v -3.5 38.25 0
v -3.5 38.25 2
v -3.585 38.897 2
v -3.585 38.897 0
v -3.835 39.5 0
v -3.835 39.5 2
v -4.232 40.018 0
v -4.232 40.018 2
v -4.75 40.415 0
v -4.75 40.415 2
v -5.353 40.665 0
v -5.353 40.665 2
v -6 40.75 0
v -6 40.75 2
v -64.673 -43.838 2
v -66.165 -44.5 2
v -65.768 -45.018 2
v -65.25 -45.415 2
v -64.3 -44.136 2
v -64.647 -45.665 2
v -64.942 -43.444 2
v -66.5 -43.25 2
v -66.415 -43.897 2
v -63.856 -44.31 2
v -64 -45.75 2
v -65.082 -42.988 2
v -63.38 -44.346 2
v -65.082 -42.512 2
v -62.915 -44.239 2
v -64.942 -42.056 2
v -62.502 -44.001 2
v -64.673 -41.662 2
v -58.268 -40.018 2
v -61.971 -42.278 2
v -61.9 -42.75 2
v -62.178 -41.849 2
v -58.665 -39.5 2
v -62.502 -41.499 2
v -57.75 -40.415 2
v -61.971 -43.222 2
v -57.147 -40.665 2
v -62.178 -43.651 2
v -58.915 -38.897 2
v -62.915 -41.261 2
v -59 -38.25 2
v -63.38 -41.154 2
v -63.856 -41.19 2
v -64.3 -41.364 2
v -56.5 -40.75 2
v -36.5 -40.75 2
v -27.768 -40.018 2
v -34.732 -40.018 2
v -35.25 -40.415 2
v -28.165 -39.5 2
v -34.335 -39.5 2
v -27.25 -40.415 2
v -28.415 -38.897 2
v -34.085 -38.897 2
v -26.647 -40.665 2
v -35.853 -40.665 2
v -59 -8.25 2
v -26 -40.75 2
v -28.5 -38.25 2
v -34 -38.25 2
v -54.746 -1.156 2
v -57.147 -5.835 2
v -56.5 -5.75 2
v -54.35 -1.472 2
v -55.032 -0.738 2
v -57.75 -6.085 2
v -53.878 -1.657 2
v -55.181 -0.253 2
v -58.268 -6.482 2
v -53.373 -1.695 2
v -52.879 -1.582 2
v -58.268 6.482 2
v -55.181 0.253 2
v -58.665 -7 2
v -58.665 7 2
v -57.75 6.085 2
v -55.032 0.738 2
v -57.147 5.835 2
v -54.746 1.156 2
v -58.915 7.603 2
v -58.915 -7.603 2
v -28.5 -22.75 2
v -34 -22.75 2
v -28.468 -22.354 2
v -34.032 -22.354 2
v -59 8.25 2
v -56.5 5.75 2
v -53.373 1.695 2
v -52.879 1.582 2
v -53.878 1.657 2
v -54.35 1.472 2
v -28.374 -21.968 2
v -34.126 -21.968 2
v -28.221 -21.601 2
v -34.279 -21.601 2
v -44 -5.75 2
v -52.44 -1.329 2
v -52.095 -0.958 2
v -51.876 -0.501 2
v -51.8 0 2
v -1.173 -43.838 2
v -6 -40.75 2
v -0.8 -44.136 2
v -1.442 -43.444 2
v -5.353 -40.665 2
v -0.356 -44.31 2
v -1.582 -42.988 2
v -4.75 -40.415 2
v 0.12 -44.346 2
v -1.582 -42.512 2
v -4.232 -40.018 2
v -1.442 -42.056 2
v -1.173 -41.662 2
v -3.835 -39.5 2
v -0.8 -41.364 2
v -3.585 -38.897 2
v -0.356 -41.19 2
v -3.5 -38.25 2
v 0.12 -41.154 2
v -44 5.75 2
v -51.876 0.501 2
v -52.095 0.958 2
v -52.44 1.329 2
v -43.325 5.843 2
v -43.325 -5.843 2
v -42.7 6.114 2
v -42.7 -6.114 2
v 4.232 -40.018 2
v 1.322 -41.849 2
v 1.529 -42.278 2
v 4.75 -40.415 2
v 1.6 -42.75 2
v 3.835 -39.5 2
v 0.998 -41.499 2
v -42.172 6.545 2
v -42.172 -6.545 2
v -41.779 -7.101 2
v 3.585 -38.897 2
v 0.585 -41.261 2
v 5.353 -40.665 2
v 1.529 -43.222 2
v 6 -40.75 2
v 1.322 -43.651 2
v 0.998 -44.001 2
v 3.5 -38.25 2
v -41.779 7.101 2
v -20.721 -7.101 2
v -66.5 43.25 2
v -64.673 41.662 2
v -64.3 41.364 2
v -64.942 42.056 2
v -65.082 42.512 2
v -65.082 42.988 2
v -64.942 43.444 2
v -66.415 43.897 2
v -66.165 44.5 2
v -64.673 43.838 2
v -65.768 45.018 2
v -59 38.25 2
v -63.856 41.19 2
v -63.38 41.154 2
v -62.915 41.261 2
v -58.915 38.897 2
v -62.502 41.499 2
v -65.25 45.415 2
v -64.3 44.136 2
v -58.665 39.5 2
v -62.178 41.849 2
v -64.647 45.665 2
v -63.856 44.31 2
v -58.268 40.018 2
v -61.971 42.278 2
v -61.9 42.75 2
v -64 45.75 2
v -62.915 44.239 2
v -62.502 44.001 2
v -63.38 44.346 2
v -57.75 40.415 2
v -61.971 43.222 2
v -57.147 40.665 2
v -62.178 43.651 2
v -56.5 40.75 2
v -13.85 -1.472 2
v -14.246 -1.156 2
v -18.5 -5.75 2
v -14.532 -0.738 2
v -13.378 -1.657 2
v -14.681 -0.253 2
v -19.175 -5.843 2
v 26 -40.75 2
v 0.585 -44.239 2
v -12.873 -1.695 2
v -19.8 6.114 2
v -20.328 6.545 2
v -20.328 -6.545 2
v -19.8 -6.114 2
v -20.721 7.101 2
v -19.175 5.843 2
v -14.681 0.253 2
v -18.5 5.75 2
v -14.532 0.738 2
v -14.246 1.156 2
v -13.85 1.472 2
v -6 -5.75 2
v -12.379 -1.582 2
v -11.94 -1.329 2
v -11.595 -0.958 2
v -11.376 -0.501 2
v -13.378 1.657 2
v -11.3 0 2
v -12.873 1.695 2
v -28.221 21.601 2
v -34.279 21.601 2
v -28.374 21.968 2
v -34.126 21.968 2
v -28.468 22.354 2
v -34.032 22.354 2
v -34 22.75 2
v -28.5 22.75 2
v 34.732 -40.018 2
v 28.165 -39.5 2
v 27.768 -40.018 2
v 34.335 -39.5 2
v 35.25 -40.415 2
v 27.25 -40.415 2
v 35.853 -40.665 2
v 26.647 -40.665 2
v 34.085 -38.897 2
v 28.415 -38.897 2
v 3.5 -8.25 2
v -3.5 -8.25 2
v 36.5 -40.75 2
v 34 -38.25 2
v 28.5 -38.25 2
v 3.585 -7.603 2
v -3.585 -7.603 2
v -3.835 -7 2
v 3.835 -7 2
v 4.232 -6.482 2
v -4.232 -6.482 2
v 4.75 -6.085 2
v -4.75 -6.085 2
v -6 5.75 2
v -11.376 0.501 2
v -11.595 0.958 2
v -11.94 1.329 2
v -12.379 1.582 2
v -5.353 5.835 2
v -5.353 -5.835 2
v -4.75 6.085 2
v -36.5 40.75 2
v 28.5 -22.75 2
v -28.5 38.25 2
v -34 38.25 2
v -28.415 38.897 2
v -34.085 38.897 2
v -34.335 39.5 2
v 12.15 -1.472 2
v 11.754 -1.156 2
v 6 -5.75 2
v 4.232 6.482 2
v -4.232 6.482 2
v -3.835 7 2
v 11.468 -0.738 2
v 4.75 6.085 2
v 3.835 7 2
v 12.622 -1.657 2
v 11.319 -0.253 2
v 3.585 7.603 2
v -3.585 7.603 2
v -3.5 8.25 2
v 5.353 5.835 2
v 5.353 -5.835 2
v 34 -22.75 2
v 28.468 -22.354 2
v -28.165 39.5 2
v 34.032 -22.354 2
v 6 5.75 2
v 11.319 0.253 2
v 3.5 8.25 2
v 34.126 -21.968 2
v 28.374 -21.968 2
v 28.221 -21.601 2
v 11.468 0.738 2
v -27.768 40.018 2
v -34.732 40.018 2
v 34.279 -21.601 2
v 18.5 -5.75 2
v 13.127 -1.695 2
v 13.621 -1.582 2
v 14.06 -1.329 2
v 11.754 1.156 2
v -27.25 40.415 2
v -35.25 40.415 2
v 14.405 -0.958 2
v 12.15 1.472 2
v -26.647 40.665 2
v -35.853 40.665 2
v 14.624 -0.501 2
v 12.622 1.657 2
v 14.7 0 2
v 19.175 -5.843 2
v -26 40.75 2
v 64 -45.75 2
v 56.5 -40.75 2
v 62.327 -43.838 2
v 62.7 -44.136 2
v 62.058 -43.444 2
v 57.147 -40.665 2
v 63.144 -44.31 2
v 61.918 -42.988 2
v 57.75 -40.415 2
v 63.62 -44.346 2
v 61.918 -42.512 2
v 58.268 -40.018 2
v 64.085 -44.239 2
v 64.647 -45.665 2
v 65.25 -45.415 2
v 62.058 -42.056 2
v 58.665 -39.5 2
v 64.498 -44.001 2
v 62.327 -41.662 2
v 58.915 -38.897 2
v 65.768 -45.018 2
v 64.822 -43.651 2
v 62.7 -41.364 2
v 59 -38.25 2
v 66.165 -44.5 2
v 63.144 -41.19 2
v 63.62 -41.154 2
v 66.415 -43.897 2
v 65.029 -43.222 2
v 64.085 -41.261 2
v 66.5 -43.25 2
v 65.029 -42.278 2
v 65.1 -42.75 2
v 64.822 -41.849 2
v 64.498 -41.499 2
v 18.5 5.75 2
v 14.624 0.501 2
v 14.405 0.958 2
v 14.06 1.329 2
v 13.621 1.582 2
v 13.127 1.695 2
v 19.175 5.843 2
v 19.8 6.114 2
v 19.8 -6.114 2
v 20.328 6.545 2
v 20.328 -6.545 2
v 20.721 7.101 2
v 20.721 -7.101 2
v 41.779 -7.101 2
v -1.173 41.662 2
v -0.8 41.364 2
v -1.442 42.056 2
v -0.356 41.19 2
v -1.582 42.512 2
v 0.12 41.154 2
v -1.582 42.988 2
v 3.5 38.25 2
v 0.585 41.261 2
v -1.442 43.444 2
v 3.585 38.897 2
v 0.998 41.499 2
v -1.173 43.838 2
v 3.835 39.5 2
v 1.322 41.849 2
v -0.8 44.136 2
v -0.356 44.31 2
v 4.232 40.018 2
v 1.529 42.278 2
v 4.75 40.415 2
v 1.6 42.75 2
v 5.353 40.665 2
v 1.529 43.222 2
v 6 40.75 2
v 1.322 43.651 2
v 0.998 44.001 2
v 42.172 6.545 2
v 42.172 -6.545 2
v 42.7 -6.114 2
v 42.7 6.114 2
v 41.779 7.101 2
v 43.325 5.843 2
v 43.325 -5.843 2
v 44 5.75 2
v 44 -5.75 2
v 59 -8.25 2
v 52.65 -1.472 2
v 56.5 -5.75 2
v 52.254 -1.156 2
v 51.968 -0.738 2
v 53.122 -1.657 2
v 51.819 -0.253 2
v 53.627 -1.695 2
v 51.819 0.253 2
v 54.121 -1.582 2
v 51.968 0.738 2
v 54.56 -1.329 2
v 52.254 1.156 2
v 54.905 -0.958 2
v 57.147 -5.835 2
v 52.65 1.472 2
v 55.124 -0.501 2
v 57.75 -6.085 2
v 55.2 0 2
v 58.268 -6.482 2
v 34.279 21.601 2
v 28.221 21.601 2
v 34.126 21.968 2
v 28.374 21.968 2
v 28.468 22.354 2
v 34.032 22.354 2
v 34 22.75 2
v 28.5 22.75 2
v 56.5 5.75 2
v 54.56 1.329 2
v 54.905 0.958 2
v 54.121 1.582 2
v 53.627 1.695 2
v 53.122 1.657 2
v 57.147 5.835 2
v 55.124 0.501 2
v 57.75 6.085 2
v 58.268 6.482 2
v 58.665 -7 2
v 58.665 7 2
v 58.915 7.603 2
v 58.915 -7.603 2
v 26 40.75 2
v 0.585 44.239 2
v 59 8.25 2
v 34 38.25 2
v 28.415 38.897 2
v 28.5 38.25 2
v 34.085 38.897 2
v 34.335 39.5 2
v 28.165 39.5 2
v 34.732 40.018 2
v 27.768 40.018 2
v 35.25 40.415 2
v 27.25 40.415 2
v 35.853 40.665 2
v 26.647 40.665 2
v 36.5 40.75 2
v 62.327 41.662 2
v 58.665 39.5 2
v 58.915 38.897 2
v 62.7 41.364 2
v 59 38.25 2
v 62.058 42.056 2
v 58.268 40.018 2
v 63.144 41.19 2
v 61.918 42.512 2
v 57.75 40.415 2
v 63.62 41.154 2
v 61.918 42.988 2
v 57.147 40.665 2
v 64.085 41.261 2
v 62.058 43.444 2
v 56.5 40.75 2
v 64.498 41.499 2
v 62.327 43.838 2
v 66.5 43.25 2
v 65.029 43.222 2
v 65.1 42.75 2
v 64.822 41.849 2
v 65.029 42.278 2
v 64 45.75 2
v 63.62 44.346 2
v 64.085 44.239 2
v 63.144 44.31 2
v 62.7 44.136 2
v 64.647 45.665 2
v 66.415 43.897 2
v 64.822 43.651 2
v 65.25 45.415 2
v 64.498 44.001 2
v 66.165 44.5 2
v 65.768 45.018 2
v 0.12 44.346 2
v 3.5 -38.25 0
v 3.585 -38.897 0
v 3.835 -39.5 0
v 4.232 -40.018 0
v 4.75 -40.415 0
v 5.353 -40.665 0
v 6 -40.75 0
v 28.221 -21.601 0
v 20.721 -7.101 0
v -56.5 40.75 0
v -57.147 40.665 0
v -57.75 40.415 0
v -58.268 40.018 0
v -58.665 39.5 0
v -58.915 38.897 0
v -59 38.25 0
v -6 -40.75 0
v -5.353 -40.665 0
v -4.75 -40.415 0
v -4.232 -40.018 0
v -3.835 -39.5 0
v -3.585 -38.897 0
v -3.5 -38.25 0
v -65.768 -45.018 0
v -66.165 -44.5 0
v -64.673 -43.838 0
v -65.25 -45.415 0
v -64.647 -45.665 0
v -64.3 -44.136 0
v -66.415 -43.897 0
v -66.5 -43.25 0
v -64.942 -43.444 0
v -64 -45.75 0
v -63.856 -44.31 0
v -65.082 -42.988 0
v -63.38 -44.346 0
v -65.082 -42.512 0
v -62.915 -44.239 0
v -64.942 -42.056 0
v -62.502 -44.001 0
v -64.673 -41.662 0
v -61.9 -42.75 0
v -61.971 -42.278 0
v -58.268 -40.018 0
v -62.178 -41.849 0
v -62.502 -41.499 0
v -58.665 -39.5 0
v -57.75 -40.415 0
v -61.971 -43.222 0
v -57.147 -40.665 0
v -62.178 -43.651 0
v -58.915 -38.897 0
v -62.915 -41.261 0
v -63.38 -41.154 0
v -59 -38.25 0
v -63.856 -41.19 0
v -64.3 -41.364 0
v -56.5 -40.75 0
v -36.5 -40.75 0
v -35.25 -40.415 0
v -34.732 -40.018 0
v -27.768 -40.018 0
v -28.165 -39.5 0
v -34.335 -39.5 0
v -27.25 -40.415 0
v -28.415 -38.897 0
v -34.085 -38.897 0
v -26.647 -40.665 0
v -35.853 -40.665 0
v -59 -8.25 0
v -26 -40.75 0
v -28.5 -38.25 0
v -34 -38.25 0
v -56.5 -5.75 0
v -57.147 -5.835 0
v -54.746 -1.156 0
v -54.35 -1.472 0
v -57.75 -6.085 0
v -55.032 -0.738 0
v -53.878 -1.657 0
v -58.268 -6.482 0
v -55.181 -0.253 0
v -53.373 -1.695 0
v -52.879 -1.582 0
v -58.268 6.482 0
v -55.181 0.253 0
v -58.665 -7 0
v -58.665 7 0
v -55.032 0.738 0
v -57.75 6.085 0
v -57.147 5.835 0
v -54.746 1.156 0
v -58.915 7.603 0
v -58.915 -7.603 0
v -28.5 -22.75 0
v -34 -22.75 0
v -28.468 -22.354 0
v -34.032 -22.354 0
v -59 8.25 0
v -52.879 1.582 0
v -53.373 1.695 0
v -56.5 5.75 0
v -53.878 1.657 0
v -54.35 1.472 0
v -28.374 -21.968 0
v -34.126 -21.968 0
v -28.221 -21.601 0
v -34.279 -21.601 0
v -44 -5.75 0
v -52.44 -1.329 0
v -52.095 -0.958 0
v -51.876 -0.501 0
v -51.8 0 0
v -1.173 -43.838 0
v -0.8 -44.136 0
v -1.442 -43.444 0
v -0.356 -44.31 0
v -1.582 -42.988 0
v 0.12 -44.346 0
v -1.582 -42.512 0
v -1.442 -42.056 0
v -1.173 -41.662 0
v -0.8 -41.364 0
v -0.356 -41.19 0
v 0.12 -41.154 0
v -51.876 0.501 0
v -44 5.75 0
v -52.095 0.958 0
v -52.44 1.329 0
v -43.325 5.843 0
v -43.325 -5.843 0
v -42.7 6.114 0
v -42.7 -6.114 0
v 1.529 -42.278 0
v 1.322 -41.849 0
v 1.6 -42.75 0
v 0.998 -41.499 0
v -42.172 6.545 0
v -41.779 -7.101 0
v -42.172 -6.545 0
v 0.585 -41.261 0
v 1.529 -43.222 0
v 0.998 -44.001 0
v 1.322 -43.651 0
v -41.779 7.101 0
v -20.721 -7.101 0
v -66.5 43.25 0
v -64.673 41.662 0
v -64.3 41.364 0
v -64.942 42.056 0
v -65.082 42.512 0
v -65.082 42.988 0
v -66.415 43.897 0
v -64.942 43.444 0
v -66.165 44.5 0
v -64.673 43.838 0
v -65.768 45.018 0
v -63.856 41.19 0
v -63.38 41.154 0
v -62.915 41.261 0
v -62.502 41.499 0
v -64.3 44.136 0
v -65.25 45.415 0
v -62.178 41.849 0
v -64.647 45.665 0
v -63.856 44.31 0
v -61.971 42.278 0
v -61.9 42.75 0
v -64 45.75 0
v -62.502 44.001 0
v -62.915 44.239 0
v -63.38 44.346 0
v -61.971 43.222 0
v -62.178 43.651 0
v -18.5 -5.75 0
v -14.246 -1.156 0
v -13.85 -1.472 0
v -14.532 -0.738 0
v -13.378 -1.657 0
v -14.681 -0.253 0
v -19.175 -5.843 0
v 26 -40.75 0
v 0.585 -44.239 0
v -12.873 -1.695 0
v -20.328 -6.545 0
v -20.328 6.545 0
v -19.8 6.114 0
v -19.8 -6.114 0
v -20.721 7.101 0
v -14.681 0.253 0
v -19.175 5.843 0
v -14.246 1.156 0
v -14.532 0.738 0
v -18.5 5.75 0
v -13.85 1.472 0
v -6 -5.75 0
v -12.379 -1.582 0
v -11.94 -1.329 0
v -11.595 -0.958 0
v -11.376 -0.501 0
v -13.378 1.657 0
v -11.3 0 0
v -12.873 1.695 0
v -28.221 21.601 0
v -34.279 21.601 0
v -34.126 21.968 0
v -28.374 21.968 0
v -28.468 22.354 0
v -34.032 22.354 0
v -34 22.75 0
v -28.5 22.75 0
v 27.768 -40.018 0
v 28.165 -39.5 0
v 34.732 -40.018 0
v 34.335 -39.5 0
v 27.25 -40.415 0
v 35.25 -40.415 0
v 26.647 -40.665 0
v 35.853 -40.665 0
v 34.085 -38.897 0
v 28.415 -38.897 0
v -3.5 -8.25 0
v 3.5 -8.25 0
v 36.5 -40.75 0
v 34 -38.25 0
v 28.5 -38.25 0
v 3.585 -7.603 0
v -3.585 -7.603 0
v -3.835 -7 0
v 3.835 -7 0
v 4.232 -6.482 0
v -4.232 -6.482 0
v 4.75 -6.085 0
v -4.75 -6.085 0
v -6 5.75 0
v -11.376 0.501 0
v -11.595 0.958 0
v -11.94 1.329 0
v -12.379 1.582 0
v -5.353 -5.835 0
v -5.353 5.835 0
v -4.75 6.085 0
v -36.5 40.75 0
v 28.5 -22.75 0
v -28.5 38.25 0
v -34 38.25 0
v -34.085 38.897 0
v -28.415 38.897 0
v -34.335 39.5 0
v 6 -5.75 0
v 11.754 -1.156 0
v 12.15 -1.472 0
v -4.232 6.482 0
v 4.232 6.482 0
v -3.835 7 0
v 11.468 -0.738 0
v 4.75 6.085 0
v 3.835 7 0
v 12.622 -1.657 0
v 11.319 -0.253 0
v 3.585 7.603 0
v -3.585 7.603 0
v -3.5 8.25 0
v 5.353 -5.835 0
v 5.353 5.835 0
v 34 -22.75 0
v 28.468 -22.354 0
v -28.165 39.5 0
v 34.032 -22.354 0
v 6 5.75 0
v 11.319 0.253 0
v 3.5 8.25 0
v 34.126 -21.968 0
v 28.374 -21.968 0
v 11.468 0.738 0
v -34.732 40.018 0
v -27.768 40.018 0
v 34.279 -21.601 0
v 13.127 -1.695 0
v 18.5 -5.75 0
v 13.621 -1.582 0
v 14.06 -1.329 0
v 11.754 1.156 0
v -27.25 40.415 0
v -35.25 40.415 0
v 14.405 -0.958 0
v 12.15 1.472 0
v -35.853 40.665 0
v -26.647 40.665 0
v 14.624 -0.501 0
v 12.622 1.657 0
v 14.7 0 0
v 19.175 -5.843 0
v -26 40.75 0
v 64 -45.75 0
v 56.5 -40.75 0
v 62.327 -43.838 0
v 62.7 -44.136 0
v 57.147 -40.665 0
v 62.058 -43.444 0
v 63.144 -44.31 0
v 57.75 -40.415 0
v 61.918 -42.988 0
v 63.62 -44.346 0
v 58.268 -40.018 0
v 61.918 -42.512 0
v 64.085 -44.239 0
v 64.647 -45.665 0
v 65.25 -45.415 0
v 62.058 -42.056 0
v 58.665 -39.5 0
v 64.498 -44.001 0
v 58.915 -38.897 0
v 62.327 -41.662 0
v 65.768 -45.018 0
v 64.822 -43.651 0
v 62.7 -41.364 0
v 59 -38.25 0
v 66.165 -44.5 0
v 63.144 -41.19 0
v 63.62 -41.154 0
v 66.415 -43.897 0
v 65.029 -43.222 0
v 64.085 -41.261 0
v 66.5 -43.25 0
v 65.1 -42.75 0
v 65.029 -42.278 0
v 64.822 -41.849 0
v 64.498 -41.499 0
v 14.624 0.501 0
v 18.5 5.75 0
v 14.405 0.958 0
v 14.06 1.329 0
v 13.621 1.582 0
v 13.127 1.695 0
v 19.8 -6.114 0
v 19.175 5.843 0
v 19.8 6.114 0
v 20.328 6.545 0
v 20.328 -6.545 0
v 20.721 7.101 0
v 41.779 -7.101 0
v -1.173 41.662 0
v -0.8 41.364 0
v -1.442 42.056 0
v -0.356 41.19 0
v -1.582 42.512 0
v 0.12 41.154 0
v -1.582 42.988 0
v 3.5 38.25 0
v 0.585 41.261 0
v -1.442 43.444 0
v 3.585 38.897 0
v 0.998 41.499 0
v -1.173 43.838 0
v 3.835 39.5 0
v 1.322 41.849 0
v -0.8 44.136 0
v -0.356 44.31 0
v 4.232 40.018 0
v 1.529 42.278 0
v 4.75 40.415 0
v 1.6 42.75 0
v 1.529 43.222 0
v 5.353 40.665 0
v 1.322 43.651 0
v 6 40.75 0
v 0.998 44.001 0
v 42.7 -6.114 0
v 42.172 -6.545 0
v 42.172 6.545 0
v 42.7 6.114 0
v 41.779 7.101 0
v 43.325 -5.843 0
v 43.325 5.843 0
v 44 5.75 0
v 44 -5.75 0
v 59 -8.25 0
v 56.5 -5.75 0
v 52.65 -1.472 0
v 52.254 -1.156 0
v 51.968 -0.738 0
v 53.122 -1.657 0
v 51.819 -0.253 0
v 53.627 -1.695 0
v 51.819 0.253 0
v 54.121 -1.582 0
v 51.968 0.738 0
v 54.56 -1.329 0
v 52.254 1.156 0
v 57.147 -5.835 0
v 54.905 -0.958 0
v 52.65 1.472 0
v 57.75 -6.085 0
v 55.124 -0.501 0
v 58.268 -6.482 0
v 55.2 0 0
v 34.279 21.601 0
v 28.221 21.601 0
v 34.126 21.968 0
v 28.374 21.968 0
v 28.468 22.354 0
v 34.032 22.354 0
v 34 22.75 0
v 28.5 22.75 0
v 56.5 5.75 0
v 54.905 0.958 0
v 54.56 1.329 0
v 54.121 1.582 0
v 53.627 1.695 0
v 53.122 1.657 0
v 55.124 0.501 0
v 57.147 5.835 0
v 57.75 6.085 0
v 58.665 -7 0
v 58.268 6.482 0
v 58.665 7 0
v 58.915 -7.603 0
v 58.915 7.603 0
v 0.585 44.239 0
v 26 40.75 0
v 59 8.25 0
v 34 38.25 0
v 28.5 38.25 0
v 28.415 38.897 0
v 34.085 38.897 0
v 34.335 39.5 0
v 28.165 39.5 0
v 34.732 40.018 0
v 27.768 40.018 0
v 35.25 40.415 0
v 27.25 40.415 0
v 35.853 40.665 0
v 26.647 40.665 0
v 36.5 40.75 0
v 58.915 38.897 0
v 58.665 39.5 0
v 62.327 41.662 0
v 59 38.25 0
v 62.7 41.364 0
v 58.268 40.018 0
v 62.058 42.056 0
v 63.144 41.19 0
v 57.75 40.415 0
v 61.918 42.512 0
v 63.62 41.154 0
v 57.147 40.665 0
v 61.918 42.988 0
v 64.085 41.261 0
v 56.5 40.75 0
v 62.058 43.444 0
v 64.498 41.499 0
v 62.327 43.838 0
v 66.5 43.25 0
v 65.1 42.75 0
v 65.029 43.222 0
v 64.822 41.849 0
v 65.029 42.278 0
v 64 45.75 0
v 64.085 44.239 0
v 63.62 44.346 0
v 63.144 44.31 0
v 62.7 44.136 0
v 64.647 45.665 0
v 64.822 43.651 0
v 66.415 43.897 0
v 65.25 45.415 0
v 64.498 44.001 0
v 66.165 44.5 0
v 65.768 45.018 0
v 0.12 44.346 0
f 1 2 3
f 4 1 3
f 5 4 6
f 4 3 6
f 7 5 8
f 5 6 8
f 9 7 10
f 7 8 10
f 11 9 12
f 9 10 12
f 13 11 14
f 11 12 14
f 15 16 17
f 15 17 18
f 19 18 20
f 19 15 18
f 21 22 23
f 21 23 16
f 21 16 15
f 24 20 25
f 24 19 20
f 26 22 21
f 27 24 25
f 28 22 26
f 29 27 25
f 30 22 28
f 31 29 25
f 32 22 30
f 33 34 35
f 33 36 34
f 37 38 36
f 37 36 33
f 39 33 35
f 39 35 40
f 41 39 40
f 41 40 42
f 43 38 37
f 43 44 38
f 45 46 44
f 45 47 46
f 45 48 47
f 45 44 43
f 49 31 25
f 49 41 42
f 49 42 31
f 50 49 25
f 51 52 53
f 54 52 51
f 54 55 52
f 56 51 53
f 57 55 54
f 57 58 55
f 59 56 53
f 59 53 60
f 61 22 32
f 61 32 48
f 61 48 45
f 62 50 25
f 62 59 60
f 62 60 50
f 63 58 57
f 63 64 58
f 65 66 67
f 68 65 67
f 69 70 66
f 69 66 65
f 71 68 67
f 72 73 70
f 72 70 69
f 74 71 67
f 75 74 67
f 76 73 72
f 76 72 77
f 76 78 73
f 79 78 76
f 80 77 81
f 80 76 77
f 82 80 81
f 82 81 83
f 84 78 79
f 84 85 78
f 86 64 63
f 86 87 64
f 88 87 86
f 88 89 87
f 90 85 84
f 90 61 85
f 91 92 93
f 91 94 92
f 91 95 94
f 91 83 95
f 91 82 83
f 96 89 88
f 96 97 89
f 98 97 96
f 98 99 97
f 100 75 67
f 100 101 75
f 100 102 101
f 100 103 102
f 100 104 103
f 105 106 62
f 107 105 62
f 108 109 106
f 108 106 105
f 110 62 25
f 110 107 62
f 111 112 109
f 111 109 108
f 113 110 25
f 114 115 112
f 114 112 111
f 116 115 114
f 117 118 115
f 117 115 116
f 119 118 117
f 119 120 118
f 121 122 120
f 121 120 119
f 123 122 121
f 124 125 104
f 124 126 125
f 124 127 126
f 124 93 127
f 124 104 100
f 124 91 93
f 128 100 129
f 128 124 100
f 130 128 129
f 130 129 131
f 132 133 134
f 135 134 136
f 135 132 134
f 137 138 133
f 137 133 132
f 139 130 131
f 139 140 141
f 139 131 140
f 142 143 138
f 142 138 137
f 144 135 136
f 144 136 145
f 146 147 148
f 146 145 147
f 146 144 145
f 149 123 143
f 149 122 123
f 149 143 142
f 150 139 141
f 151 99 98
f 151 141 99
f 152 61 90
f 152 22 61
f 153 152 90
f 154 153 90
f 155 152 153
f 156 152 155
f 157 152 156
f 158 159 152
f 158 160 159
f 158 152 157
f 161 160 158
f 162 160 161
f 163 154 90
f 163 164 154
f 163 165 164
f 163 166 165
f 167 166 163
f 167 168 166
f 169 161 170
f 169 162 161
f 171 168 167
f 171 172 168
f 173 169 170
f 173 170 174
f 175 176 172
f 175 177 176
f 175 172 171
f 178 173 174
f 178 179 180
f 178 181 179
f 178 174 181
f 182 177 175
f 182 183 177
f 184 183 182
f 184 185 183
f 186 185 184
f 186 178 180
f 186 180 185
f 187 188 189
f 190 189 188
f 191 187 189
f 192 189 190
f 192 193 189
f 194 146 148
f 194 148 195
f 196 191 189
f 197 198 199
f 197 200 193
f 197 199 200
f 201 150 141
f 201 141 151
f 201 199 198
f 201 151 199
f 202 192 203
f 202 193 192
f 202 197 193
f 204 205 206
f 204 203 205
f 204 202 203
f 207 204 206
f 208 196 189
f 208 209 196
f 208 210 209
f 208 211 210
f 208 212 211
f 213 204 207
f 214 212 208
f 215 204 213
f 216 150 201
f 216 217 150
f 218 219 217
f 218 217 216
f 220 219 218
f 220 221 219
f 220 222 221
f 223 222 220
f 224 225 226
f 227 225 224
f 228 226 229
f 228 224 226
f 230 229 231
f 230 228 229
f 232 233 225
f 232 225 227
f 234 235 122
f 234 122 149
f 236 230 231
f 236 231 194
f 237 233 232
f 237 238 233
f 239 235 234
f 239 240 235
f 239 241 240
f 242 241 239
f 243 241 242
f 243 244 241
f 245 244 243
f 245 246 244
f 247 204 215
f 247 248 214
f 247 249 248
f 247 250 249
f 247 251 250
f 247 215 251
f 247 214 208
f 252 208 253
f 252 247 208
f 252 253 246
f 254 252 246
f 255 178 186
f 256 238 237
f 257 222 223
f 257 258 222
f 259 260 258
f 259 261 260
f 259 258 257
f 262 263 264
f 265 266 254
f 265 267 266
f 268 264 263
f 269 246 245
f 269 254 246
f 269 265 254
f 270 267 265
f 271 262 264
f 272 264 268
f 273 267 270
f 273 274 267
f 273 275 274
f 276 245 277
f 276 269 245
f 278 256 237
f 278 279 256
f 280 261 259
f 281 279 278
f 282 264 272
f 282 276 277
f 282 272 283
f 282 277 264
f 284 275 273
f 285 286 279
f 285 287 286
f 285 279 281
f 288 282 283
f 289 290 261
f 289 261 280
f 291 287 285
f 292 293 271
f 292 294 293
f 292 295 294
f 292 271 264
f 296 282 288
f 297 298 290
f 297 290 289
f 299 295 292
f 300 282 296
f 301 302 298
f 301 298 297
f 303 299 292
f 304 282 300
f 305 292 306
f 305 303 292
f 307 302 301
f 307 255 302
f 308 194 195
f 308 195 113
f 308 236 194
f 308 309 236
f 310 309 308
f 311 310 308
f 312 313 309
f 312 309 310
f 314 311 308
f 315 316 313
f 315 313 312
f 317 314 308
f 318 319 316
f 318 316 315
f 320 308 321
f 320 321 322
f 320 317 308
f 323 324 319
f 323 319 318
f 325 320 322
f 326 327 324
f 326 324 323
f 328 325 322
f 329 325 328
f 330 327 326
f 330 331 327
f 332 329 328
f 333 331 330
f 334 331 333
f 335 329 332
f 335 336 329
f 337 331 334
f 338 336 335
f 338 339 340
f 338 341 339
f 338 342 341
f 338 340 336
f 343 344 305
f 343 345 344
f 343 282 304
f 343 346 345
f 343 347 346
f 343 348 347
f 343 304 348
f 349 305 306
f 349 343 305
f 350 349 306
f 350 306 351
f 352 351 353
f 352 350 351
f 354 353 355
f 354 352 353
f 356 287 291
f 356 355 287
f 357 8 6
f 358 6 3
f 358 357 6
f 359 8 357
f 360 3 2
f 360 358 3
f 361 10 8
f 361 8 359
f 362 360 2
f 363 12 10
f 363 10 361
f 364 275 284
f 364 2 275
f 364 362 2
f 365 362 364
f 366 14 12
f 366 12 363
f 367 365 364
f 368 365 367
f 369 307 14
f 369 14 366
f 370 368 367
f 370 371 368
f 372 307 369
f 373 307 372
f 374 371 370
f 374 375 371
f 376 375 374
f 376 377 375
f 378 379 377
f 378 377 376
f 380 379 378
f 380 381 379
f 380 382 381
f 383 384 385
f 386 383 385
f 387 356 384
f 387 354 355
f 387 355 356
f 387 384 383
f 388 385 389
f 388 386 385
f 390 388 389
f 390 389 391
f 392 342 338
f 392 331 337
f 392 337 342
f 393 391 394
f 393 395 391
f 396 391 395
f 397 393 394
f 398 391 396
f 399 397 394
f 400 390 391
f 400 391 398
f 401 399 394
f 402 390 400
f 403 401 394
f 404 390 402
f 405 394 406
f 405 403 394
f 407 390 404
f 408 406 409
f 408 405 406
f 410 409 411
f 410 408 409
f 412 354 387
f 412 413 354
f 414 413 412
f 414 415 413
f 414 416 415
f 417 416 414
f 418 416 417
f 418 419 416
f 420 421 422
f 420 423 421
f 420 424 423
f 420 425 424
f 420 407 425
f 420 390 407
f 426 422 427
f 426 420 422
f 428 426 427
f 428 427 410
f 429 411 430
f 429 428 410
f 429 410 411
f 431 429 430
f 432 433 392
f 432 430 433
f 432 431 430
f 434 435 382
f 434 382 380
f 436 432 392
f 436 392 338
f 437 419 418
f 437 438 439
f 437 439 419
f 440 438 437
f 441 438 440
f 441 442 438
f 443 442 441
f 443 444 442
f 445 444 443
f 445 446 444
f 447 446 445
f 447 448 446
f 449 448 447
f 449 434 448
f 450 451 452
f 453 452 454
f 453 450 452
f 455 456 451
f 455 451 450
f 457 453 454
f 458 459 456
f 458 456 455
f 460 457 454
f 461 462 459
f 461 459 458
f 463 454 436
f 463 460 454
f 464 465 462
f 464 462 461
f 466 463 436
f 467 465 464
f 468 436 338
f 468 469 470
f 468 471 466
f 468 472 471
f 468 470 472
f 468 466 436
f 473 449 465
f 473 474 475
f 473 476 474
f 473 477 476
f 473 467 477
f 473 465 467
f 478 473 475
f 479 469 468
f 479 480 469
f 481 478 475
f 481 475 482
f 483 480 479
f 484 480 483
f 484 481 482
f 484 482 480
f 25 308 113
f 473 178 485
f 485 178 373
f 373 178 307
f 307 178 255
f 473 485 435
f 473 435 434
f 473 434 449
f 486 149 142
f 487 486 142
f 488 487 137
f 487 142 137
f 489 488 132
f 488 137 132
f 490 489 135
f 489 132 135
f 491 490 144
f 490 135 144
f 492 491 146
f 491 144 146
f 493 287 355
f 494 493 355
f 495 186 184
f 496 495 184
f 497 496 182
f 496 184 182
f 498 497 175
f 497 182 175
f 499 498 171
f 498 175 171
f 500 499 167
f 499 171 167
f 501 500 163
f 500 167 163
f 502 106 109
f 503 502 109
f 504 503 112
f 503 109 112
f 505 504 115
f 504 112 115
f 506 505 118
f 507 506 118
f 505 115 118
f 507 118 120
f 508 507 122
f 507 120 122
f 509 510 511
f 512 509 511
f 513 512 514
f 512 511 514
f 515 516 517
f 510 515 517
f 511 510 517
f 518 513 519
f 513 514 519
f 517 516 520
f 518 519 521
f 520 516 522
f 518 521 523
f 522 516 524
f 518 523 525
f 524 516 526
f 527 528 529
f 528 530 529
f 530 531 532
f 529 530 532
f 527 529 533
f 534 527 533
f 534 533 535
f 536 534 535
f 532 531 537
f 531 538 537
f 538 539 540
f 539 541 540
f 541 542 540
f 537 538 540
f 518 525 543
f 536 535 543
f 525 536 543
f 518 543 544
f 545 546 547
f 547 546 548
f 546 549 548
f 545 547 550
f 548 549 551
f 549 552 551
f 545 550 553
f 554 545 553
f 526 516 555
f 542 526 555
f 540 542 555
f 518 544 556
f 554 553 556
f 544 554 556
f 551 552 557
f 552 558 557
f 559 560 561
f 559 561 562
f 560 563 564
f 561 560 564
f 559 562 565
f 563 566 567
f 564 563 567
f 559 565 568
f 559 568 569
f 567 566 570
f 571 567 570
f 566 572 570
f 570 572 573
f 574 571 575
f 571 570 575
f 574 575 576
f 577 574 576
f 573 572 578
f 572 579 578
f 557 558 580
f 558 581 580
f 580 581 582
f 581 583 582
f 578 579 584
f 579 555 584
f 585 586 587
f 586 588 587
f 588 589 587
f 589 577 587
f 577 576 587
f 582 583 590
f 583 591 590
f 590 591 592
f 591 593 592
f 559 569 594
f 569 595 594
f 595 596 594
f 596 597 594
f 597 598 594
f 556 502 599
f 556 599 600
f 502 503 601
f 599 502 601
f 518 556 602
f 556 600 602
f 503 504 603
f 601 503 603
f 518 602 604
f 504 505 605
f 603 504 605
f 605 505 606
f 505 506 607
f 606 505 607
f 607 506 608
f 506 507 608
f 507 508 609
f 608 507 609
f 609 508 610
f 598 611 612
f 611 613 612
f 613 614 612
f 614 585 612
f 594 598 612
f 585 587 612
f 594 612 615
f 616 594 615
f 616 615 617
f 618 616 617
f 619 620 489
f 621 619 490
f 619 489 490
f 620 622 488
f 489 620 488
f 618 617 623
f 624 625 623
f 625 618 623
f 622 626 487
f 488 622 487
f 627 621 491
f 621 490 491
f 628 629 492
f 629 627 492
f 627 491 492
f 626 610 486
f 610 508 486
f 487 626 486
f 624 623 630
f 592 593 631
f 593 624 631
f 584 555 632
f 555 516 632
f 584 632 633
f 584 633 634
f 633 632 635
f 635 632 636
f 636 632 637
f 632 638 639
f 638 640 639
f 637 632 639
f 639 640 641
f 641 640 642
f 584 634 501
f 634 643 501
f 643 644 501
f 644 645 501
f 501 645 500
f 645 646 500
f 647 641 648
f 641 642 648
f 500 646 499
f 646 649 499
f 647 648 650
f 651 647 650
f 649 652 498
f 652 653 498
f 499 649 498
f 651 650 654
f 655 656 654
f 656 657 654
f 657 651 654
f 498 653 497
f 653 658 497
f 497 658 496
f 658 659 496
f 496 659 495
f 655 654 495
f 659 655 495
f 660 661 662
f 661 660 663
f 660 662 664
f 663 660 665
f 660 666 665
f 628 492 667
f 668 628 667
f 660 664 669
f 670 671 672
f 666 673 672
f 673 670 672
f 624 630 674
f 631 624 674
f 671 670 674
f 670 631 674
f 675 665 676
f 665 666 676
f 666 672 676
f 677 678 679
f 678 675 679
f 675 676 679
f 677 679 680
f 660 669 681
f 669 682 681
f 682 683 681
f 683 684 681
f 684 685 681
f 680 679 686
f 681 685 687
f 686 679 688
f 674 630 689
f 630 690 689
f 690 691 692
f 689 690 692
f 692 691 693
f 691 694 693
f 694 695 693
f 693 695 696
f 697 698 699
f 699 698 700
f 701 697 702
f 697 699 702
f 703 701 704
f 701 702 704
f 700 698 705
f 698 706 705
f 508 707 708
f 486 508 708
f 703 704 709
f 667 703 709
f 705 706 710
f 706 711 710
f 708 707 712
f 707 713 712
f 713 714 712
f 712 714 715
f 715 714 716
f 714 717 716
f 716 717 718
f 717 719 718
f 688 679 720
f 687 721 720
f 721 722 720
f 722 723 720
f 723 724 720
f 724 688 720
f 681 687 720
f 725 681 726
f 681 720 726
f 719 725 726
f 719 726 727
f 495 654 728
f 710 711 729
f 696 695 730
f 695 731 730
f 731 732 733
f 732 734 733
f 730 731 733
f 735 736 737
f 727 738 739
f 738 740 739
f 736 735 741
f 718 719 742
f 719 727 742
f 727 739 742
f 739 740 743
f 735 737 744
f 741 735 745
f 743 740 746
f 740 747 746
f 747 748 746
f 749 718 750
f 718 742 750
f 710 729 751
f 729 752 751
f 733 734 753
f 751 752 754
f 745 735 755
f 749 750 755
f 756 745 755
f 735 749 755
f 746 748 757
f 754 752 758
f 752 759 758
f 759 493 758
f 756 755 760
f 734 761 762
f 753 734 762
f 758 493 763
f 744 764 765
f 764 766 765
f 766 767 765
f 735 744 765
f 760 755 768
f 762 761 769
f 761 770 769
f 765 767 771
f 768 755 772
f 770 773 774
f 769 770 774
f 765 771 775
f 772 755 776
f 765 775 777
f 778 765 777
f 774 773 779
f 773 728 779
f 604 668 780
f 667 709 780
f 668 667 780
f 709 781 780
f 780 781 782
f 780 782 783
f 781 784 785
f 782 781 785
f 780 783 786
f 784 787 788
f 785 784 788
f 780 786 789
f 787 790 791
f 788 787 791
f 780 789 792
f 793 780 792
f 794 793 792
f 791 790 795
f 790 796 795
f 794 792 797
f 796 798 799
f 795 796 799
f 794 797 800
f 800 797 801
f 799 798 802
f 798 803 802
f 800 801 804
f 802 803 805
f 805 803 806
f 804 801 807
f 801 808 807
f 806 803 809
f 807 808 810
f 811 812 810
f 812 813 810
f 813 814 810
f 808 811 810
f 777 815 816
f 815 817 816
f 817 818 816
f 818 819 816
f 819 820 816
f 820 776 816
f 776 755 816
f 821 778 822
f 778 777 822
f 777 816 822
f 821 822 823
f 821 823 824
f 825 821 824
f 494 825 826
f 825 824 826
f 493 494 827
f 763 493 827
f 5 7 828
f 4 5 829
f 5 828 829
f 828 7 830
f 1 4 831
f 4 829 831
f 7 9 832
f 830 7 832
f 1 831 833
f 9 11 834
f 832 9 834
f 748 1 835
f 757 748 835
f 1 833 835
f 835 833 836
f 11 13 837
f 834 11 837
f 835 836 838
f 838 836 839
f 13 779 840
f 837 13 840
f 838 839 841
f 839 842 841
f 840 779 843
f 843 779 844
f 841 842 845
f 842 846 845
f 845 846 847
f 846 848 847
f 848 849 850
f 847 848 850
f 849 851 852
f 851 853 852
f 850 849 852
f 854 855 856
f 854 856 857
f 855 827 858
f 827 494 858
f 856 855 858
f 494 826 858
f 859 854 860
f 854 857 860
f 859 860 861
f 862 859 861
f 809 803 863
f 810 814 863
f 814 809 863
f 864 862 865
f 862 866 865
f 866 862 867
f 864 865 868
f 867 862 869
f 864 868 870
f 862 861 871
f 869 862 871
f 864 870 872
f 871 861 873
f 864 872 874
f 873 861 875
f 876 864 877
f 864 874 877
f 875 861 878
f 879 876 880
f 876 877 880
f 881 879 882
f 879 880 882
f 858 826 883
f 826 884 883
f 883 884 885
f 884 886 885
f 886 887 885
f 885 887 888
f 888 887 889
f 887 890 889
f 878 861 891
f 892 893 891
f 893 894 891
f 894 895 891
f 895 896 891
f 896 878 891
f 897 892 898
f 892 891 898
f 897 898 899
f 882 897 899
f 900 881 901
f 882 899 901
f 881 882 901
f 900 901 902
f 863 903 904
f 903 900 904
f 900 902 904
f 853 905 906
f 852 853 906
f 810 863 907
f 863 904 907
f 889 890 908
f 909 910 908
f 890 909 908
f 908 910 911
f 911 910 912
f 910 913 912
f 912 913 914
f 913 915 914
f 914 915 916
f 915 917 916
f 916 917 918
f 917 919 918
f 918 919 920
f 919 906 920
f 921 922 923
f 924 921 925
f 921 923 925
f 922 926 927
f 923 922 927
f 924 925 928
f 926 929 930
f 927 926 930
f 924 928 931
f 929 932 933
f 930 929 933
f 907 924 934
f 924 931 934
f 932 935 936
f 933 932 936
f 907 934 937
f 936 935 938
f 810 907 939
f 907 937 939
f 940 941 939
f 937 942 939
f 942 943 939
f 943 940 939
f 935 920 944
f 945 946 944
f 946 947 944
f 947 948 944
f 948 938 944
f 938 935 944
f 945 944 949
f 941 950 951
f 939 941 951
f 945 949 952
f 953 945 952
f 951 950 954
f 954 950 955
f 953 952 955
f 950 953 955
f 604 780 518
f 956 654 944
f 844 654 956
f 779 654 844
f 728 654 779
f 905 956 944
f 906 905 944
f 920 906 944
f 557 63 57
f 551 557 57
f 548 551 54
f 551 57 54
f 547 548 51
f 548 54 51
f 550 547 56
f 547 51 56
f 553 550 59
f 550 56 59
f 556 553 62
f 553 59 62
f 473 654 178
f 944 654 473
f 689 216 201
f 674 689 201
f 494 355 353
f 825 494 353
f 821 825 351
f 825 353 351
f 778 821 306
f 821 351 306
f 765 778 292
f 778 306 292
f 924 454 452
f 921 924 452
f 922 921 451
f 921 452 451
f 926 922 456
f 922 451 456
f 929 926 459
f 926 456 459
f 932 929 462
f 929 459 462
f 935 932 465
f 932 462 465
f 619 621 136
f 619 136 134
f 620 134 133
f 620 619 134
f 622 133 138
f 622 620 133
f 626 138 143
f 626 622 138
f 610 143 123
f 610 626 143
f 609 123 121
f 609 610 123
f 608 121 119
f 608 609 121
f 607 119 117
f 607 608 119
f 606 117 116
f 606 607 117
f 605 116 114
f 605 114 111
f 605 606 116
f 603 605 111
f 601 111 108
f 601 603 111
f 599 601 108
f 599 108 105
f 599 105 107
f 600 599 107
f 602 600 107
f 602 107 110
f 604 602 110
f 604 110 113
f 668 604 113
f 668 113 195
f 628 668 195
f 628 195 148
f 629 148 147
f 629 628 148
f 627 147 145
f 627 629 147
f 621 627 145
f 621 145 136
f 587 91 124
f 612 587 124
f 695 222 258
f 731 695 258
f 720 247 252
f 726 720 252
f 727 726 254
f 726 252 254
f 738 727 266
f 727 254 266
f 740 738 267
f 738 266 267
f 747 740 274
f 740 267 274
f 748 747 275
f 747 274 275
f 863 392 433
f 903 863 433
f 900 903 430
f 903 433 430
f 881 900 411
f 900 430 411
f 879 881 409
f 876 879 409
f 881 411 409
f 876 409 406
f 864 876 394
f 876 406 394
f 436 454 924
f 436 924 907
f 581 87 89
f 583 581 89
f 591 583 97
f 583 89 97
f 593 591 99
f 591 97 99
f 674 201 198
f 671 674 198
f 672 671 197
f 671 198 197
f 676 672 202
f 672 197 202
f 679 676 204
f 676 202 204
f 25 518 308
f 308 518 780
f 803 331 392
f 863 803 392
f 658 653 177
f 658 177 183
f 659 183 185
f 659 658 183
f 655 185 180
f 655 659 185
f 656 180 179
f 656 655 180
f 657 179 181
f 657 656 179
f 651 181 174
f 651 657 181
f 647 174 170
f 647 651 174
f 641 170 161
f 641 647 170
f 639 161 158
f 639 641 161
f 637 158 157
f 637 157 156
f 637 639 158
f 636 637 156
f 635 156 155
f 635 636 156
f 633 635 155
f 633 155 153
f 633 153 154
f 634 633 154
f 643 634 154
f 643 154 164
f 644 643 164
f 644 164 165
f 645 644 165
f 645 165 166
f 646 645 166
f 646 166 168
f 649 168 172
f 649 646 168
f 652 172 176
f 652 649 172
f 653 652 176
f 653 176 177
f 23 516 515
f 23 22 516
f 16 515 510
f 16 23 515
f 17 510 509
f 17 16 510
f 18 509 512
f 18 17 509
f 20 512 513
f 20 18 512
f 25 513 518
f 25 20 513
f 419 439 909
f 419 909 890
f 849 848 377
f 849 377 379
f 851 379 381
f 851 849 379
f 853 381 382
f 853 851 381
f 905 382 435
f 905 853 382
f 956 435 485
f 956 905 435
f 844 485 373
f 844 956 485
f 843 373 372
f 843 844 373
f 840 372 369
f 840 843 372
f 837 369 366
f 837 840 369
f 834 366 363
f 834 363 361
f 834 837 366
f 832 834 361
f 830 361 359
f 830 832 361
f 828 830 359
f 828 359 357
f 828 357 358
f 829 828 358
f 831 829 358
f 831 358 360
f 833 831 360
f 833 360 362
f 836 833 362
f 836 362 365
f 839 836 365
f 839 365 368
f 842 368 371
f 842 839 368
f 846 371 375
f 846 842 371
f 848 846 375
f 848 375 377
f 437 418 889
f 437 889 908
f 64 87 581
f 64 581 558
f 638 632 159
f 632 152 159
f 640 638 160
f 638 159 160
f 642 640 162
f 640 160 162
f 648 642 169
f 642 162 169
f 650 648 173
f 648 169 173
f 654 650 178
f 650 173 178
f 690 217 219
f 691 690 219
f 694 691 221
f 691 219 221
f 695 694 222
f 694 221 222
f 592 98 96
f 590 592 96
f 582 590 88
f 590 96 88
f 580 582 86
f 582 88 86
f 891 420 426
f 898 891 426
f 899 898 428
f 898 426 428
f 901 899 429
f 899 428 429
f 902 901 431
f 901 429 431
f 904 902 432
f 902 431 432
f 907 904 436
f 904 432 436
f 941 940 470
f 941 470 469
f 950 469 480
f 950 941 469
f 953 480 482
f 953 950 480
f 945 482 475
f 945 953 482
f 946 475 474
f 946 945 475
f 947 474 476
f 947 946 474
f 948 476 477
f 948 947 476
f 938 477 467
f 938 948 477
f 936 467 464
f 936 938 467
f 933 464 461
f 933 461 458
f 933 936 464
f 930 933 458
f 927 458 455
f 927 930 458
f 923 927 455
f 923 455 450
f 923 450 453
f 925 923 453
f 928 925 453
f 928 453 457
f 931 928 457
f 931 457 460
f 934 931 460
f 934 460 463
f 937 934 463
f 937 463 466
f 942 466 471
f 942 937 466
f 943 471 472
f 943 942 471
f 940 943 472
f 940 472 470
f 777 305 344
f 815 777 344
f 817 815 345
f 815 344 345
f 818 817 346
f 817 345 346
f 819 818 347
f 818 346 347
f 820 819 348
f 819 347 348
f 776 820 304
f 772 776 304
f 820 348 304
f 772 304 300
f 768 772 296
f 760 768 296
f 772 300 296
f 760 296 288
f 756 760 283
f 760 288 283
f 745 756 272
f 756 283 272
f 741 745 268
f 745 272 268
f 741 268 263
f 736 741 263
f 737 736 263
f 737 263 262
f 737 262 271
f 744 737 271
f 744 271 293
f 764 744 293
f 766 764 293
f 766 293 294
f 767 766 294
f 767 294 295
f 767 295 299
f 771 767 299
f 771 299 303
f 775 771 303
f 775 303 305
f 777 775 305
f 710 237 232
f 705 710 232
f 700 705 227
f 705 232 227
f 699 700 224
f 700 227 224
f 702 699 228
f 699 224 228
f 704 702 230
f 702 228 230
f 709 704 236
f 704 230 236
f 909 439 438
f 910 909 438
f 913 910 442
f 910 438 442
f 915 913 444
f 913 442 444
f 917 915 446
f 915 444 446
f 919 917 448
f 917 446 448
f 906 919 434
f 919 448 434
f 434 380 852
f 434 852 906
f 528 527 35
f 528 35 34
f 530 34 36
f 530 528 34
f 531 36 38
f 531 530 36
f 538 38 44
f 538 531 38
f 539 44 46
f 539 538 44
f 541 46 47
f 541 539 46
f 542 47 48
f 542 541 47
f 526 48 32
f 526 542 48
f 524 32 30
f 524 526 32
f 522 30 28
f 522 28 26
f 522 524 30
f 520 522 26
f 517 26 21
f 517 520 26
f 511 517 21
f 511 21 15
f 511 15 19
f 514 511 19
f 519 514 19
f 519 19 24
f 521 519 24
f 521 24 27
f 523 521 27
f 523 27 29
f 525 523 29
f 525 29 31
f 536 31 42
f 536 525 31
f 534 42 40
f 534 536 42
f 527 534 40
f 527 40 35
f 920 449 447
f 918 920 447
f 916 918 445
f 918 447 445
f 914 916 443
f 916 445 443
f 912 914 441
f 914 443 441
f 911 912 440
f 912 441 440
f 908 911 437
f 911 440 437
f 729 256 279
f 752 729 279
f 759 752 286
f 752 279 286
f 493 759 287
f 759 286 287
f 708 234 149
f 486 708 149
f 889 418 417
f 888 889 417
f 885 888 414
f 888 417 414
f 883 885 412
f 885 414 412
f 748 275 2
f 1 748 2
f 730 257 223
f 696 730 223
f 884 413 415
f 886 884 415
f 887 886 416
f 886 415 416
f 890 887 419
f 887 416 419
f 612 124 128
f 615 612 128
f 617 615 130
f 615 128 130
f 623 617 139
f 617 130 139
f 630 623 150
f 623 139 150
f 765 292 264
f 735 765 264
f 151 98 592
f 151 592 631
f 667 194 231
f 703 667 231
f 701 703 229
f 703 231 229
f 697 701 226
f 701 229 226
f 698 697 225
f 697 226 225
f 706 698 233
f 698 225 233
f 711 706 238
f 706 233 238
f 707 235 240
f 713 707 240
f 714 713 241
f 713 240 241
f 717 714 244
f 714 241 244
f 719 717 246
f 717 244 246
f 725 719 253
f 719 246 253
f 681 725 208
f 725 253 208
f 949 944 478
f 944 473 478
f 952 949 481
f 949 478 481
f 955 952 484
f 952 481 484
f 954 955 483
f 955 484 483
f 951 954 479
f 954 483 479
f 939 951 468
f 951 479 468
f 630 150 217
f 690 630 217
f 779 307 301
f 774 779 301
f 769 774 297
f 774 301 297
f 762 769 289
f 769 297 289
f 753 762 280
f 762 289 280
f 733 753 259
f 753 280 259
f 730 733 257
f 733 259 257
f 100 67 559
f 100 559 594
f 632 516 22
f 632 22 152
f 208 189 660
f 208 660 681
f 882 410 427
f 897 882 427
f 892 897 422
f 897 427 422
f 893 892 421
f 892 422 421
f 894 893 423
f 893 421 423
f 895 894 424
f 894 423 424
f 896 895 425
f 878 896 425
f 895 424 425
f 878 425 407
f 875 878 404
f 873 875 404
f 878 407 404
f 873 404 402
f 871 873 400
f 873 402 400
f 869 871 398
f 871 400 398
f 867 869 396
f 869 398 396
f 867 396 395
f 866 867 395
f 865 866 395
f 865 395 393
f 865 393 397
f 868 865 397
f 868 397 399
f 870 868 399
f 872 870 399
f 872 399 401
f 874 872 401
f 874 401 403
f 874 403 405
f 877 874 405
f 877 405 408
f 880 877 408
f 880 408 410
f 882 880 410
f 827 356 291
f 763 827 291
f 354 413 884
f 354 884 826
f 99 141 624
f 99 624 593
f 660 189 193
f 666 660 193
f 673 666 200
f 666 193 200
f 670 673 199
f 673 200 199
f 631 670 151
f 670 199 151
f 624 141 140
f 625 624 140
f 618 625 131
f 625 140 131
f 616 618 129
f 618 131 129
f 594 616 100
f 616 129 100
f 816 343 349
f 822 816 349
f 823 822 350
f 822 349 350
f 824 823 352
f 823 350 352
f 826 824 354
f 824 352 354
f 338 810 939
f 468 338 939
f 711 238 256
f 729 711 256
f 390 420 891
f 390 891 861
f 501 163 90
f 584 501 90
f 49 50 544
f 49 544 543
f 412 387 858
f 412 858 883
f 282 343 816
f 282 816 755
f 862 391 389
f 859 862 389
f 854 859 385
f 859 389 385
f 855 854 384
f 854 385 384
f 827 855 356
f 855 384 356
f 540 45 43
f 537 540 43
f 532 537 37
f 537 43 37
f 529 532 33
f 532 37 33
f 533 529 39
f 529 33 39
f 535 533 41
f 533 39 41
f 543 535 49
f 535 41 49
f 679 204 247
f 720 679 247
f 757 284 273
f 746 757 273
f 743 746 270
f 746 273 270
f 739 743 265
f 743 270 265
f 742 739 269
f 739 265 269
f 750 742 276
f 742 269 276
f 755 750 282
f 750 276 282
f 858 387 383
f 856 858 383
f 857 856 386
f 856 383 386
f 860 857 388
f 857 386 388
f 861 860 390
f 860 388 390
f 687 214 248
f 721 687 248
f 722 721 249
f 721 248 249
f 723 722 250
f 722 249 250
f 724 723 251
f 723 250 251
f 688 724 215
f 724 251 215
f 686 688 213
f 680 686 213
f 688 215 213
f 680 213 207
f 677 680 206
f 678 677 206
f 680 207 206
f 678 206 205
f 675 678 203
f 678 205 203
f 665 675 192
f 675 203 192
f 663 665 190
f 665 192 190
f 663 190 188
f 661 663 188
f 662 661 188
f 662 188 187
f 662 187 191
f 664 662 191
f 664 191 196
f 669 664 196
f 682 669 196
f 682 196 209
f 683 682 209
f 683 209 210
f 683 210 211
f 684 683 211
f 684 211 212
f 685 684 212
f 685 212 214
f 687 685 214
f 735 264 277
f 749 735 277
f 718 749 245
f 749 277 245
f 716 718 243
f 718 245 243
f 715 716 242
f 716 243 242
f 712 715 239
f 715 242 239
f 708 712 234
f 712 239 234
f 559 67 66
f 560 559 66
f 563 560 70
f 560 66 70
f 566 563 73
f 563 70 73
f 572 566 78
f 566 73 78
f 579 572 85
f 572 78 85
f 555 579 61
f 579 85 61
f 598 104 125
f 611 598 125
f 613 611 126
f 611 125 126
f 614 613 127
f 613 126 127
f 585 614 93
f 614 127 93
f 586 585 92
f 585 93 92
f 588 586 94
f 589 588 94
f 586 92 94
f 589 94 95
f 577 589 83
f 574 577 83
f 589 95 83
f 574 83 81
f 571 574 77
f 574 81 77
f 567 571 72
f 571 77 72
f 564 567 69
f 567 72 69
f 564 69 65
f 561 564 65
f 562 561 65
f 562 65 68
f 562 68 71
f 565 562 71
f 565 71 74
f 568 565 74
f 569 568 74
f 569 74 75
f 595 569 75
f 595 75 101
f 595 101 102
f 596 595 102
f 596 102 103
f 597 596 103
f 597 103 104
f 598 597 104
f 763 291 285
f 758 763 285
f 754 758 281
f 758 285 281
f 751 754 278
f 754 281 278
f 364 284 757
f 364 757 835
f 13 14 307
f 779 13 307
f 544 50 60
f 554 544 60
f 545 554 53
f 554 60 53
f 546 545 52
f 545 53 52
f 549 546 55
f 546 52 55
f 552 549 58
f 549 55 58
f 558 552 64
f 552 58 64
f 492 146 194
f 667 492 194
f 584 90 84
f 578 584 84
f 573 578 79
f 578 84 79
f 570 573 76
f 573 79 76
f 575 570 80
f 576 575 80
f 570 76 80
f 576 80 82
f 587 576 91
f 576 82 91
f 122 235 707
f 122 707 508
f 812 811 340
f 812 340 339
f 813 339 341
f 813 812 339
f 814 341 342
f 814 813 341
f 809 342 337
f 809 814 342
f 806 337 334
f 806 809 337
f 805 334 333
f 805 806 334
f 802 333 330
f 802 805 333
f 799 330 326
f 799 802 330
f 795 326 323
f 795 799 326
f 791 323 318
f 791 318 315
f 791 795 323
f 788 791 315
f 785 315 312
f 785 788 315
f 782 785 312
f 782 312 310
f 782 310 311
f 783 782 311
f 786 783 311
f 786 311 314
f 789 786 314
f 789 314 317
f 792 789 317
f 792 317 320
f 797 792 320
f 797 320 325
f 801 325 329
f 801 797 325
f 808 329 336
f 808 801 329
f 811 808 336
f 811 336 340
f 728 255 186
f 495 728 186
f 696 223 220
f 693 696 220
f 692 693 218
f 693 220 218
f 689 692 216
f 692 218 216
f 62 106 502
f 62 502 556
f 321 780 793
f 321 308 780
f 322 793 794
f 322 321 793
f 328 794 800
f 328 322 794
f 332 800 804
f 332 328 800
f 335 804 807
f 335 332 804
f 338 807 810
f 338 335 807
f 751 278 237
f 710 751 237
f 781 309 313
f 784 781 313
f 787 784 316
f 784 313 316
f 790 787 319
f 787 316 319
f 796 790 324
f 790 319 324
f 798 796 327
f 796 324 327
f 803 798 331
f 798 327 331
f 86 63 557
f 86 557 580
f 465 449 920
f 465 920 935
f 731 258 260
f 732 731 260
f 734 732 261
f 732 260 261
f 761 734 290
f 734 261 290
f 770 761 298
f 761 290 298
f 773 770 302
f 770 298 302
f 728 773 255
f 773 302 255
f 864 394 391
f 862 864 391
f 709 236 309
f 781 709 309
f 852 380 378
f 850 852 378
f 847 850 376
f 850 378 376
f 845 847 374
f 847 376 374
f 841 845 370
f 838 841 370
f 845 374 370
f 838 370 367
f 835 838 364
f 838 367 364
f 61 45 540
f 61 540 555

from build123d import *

# Parameters (mm, degrees)
SKETCH_W        = 133
SKETCH_H        = 91.5
SKETCH_R        = 1.6
PAD_DEPTH       = 2
SKETCH001_R     = 1.7
POCKET_DEPTH    = 2.001
POCKET001_DEPTH = 2.001
FILLET_R        = 2.5


with BuildPart() as part:
    # Sketch → Pad (new body)
    with BuildSketch(Plane.XY):
        Rectangle(SKETCH_W, SKETCH_H)
        with Locations((-63.5, 42.75)):
            Circle(SKETCH_R, mode=Mode.SUBTRACT)
        with Locations((0, 42.75)):
            Circle(SKETCH_R, mode=Mode.SUBTRACT)
        with Locations((63.5, 42.75)):
            Circle(SKETCH_R, mode=Mode.SUBTRACT)
        with Locations((0, -42.75)):
            Circle(SKETCH_R, mode=Mode.SUBTRACT)
        with Locations((63.5, -42.75)):
            Circle(SKETCH_R, mode=Mode.SUBTRACT)
        with Locations((-63.5, -42.75)):
            Circle(SKETCH_R, mode=Mode.SUBTRACT)
    extrude(amount=PAD_DEPTH)

    # Sketch001 (on Face12 of Pad) → Pocket (cut, through all)
    with BuildSketch(Plane.XY.offset(2)):
        with Locations((13, 0)):
            Circle(SKETCH001_R)
        with Locations((53.5, 0)):
            Circle(SKETCH001_R)
        with Locations((-13, 0)):
            Circle(SKETCH001_R)
        with Locations((-53.5, 0)):
            Circle(SKETCH001_R)
    extrude(amount=-POCKET_DEPTH, mode=Mode.SUBTRACT)

    # Sketch002 (on Face5 of Pocket) → Pocket001 (cut, through all)
    with BuildSketch(Plane.XY.offset(2)):
        with BuildLine():
            Line((-59, 38.25), (-59, 8.25))
            ThreePointArc((-59, 8.25), (-58.267767, 6.482233), (-56.5, 5.75))
            Line((-56.5, 5.75), (-44, 5.75))
            ThreePointArc((-44, 5.75), (-42.700268, 6.114421), (-41.779456, 7.101443))
            Line((-41.779456, 7.101443), (-34.279456, 21.601443))
            ThreePointArc((-34.279456, 21.601443), (-34.070868, 22.158967), (-34, 22.75))
            Line((-34, 22.75), (-34, 38.25))
            ThreePointArc((-34, 38.25), (-34.732233, 40.017767), (-36.5, 40.75))
            Line((-36.5, 40.75), (-56.5, 40.75))
            ThreePointArc((-56.5, 40.75), (-58.267767, 40.017767), (-59, 38.25))
        make_face()
        with BuildLine():
            Line((-28.5, 38.25), (-28.5, 22.75))
            ThreePointArc((-28.5, 22.75), (-28.429132, 22.158967), (-28.220544, 21.601443))
            Line((-28.220544, 21.601443), (-20.720544, 7.101443))
            ThreePointArc((-20.720544, 7.101443), (-19.799732, 6.114421), (-18.5, 5.75))
            Line((-18.5, 5.75), (-6, 5.75))
            ThreePointArc((-6, 5.75), (-4.232233, 6.482233), (-3.5, 8.25))
            Line((-3.5, 8.25), (-3.5, 38.25))
            ThreePointArc((-3.5, 38.25), (-4.232233, 40.017767), (-6, 40.75))
            Line((-6, 40.75), (-26, 40.75))
            ThreePointArc((-26, 40.75), (-27.767767, 40.017767), (-28.5, 38.25))
        make_face()
        with BuildLine():
            Line((59, -38.25), (59, -8.25))
            ThreePointArc((59, -8.25), (58.267767, -6.482233), (56.5, -5.75))
            Line((56.5, -5.75), (44, -5.75))
            ThreePointArc((44, -5.75), (42.700268, -6.114421), (41.779456, -7.101443))
            Line((41.779456, -7.101443), (34.279456, -21.601443))
            ThreePointArc((34.279456, -21.601443), (34.070868, -22.158967), (34, -22.75))
            Line((34, -22.75), (34, -38.25))
            ThreePointArc((34, -38.25), (34.732233, -40.017767), (36.5, -40.75))
            Line((36.5, -40.75), (56.5, -40.75))
            ThreePointArc((56.5, -40.75), (58.267767, -40.017767), (59, -38.25))
        make_face()
        with BuildLine():
            Line((28.5, -38.25), (28.5, -22.75))
            ThreePointArc((28.5, -22.75), (28.429132, -22.158967), (28.220544, -21.601443))
            Line((28.220544, -21.601443), (20.720544, -7.101443))
            ThreePointArc((20.720544, -7.101443), (19.799732, -6.114421), (18.5, -5.75))
            Line((18.5, -5.75), (6, -5.75))
            ThreePointArc((6, -5.75), (4.232233, -6.482233), (3.5, -8.25))
            Line((3.5, -8.25), (3.5, -38.25))
            ThreePointArc((3.5, -38.25), (4.232233, -40.017767), (6, -40.75))
            Line((6, -40.75), (26, -40.75))
            ThreePointArc((26, -40.75), (27.767767, -40.017767), (28.5, -38.25))
        make_face()
        with BuildLine():
            Line((59, 38.25), (59, 8.25))
            ThreePointArc((56.5, 5.75), (58.267767, 6.482233), (59, 8.25))
            Line((56.5, 5.75), (44, 5.75))
            ThreePointArc((41.779456, 7.101443), (42.700268, 6.114421), (44, 5.75))
            Line((41.779456, 7.101443), (34.279456, 21.601443))
            ThreePointArc((34, 22.75), (34.070868, 22.158967), (34.279456, 21.601443))
            Line((34, 22.75), (34, 38.25))
            ThreePointArc((36.5, 40.75), (34.732233, 40.017767), (34, 38.25))
            Line((36.5, 40.75), (56.5, 40.75))
            ThreePointArc((59, 38.25), (58.267767, 40.017767), (56.5, 40.75))
        make_face()
        with BuildLine():
            Line((28.5, 38.25), (28.5, 22.75))
            ThreePointArc((28.220544, 21.601443), (28.429132, 22.158967), (28.5, 22.75))
            Line((28.220544, 21.601443), (20.720544, 7.101443))
            ThreePointArc((18.5, 5.75), (19.799732, 6.114421), (20.720544, 7.101443))
            Line((18.5, 5.75), (6, 5.75))
            ThreePointArc((3.5, 8.25), (4.232233, 6.482233), (6, 5.75))
            Line((3.5, 8.25), (3.5, 38.25))
            ThreePointArc((6, 40.75), (4.232233, 40.017767), (3.5, 38.25))
            Line((6, 40.75), (26, 40.75))
            ThreePointArc((28.5, 38.25), (27.767767, 40.017767), (26, 40.75))
        make_face()
        with BuildLine():
            Line((-59, -38.25), (-59, -8.25))
            ThreePointArc((-56.5, -5.75), (-58.267767, -6.482233), (-59, -8.25))
            Line((-56.5, -5.75), (-44, -5.75))
            ThreePointArc((-41.779456, -7.101443), (-42.700268, -6.114421), (-44, -5.75))
            Line((-41.779456, -7.101443), (-34.279456, -21.601443))
            ThreePointArc((-34, -22.75), (-34.070868, -22.158967), (-34.279456, -21.601443))
            Line((-34, -22.75), (-34, -38.25))
            ThreePointArc((-36.5, -40.75), (-34.732233, -40.017767), (-34, -38.25))
            Line((-36.5, -40.75), (-56.5, -40.75))
            ThreePointArc((-59, -38.25), (-58.267767, -40.017767), (-56.5, -40.75))
        make_face()
        with BuildLine():
            Line((-28.5, -38.25), (-28.5, -22.75))
            ThreePointArc((-28.220544, -21.601443), (-28.429132, -22.158967), (-28.5, -22.75))
            Line((-28.220544, -21.601443), (-20.720544, -7.101443))
            ThreePointArc((-18.5, -5.75), (-19.799732, -6.114421), (-20.720544, -7.101443))
            Line((-18.5, -5.75), (-6, -5.75))
            ThreePointArc((-3.5, -8.25), (-4.232233, -6.482233), (-6, -5.75))
            Line((-3.5, -8.25), (-3.5, -38.25))
            ThreePointArc((-6, -40.75), (-4.232233, -40.017767), (-3.5, -38.25))
            Line((-6, -40.75), (-26, -40.75))
            ThreePointArc((-28.5, -38.25), (-27.767767, -40.017767), (-26, -40.75))
        make_face()
    extrude(amount=-POCKET001_DEPTH, mode=Mode.SUBTRACT)

    # Fillet
    fillet_edges = [part.edges().sort_by_distance(p)[0] for p in [
        (-66.5, -45.75, 1),
        (66.5, -45.75, 1),
        (66.5, 45.75, 1),
        (-66.5, 45.75, 1),
    ]]
    fillet(fillet_edges, radius=FILLET_R)


solid = part.part
